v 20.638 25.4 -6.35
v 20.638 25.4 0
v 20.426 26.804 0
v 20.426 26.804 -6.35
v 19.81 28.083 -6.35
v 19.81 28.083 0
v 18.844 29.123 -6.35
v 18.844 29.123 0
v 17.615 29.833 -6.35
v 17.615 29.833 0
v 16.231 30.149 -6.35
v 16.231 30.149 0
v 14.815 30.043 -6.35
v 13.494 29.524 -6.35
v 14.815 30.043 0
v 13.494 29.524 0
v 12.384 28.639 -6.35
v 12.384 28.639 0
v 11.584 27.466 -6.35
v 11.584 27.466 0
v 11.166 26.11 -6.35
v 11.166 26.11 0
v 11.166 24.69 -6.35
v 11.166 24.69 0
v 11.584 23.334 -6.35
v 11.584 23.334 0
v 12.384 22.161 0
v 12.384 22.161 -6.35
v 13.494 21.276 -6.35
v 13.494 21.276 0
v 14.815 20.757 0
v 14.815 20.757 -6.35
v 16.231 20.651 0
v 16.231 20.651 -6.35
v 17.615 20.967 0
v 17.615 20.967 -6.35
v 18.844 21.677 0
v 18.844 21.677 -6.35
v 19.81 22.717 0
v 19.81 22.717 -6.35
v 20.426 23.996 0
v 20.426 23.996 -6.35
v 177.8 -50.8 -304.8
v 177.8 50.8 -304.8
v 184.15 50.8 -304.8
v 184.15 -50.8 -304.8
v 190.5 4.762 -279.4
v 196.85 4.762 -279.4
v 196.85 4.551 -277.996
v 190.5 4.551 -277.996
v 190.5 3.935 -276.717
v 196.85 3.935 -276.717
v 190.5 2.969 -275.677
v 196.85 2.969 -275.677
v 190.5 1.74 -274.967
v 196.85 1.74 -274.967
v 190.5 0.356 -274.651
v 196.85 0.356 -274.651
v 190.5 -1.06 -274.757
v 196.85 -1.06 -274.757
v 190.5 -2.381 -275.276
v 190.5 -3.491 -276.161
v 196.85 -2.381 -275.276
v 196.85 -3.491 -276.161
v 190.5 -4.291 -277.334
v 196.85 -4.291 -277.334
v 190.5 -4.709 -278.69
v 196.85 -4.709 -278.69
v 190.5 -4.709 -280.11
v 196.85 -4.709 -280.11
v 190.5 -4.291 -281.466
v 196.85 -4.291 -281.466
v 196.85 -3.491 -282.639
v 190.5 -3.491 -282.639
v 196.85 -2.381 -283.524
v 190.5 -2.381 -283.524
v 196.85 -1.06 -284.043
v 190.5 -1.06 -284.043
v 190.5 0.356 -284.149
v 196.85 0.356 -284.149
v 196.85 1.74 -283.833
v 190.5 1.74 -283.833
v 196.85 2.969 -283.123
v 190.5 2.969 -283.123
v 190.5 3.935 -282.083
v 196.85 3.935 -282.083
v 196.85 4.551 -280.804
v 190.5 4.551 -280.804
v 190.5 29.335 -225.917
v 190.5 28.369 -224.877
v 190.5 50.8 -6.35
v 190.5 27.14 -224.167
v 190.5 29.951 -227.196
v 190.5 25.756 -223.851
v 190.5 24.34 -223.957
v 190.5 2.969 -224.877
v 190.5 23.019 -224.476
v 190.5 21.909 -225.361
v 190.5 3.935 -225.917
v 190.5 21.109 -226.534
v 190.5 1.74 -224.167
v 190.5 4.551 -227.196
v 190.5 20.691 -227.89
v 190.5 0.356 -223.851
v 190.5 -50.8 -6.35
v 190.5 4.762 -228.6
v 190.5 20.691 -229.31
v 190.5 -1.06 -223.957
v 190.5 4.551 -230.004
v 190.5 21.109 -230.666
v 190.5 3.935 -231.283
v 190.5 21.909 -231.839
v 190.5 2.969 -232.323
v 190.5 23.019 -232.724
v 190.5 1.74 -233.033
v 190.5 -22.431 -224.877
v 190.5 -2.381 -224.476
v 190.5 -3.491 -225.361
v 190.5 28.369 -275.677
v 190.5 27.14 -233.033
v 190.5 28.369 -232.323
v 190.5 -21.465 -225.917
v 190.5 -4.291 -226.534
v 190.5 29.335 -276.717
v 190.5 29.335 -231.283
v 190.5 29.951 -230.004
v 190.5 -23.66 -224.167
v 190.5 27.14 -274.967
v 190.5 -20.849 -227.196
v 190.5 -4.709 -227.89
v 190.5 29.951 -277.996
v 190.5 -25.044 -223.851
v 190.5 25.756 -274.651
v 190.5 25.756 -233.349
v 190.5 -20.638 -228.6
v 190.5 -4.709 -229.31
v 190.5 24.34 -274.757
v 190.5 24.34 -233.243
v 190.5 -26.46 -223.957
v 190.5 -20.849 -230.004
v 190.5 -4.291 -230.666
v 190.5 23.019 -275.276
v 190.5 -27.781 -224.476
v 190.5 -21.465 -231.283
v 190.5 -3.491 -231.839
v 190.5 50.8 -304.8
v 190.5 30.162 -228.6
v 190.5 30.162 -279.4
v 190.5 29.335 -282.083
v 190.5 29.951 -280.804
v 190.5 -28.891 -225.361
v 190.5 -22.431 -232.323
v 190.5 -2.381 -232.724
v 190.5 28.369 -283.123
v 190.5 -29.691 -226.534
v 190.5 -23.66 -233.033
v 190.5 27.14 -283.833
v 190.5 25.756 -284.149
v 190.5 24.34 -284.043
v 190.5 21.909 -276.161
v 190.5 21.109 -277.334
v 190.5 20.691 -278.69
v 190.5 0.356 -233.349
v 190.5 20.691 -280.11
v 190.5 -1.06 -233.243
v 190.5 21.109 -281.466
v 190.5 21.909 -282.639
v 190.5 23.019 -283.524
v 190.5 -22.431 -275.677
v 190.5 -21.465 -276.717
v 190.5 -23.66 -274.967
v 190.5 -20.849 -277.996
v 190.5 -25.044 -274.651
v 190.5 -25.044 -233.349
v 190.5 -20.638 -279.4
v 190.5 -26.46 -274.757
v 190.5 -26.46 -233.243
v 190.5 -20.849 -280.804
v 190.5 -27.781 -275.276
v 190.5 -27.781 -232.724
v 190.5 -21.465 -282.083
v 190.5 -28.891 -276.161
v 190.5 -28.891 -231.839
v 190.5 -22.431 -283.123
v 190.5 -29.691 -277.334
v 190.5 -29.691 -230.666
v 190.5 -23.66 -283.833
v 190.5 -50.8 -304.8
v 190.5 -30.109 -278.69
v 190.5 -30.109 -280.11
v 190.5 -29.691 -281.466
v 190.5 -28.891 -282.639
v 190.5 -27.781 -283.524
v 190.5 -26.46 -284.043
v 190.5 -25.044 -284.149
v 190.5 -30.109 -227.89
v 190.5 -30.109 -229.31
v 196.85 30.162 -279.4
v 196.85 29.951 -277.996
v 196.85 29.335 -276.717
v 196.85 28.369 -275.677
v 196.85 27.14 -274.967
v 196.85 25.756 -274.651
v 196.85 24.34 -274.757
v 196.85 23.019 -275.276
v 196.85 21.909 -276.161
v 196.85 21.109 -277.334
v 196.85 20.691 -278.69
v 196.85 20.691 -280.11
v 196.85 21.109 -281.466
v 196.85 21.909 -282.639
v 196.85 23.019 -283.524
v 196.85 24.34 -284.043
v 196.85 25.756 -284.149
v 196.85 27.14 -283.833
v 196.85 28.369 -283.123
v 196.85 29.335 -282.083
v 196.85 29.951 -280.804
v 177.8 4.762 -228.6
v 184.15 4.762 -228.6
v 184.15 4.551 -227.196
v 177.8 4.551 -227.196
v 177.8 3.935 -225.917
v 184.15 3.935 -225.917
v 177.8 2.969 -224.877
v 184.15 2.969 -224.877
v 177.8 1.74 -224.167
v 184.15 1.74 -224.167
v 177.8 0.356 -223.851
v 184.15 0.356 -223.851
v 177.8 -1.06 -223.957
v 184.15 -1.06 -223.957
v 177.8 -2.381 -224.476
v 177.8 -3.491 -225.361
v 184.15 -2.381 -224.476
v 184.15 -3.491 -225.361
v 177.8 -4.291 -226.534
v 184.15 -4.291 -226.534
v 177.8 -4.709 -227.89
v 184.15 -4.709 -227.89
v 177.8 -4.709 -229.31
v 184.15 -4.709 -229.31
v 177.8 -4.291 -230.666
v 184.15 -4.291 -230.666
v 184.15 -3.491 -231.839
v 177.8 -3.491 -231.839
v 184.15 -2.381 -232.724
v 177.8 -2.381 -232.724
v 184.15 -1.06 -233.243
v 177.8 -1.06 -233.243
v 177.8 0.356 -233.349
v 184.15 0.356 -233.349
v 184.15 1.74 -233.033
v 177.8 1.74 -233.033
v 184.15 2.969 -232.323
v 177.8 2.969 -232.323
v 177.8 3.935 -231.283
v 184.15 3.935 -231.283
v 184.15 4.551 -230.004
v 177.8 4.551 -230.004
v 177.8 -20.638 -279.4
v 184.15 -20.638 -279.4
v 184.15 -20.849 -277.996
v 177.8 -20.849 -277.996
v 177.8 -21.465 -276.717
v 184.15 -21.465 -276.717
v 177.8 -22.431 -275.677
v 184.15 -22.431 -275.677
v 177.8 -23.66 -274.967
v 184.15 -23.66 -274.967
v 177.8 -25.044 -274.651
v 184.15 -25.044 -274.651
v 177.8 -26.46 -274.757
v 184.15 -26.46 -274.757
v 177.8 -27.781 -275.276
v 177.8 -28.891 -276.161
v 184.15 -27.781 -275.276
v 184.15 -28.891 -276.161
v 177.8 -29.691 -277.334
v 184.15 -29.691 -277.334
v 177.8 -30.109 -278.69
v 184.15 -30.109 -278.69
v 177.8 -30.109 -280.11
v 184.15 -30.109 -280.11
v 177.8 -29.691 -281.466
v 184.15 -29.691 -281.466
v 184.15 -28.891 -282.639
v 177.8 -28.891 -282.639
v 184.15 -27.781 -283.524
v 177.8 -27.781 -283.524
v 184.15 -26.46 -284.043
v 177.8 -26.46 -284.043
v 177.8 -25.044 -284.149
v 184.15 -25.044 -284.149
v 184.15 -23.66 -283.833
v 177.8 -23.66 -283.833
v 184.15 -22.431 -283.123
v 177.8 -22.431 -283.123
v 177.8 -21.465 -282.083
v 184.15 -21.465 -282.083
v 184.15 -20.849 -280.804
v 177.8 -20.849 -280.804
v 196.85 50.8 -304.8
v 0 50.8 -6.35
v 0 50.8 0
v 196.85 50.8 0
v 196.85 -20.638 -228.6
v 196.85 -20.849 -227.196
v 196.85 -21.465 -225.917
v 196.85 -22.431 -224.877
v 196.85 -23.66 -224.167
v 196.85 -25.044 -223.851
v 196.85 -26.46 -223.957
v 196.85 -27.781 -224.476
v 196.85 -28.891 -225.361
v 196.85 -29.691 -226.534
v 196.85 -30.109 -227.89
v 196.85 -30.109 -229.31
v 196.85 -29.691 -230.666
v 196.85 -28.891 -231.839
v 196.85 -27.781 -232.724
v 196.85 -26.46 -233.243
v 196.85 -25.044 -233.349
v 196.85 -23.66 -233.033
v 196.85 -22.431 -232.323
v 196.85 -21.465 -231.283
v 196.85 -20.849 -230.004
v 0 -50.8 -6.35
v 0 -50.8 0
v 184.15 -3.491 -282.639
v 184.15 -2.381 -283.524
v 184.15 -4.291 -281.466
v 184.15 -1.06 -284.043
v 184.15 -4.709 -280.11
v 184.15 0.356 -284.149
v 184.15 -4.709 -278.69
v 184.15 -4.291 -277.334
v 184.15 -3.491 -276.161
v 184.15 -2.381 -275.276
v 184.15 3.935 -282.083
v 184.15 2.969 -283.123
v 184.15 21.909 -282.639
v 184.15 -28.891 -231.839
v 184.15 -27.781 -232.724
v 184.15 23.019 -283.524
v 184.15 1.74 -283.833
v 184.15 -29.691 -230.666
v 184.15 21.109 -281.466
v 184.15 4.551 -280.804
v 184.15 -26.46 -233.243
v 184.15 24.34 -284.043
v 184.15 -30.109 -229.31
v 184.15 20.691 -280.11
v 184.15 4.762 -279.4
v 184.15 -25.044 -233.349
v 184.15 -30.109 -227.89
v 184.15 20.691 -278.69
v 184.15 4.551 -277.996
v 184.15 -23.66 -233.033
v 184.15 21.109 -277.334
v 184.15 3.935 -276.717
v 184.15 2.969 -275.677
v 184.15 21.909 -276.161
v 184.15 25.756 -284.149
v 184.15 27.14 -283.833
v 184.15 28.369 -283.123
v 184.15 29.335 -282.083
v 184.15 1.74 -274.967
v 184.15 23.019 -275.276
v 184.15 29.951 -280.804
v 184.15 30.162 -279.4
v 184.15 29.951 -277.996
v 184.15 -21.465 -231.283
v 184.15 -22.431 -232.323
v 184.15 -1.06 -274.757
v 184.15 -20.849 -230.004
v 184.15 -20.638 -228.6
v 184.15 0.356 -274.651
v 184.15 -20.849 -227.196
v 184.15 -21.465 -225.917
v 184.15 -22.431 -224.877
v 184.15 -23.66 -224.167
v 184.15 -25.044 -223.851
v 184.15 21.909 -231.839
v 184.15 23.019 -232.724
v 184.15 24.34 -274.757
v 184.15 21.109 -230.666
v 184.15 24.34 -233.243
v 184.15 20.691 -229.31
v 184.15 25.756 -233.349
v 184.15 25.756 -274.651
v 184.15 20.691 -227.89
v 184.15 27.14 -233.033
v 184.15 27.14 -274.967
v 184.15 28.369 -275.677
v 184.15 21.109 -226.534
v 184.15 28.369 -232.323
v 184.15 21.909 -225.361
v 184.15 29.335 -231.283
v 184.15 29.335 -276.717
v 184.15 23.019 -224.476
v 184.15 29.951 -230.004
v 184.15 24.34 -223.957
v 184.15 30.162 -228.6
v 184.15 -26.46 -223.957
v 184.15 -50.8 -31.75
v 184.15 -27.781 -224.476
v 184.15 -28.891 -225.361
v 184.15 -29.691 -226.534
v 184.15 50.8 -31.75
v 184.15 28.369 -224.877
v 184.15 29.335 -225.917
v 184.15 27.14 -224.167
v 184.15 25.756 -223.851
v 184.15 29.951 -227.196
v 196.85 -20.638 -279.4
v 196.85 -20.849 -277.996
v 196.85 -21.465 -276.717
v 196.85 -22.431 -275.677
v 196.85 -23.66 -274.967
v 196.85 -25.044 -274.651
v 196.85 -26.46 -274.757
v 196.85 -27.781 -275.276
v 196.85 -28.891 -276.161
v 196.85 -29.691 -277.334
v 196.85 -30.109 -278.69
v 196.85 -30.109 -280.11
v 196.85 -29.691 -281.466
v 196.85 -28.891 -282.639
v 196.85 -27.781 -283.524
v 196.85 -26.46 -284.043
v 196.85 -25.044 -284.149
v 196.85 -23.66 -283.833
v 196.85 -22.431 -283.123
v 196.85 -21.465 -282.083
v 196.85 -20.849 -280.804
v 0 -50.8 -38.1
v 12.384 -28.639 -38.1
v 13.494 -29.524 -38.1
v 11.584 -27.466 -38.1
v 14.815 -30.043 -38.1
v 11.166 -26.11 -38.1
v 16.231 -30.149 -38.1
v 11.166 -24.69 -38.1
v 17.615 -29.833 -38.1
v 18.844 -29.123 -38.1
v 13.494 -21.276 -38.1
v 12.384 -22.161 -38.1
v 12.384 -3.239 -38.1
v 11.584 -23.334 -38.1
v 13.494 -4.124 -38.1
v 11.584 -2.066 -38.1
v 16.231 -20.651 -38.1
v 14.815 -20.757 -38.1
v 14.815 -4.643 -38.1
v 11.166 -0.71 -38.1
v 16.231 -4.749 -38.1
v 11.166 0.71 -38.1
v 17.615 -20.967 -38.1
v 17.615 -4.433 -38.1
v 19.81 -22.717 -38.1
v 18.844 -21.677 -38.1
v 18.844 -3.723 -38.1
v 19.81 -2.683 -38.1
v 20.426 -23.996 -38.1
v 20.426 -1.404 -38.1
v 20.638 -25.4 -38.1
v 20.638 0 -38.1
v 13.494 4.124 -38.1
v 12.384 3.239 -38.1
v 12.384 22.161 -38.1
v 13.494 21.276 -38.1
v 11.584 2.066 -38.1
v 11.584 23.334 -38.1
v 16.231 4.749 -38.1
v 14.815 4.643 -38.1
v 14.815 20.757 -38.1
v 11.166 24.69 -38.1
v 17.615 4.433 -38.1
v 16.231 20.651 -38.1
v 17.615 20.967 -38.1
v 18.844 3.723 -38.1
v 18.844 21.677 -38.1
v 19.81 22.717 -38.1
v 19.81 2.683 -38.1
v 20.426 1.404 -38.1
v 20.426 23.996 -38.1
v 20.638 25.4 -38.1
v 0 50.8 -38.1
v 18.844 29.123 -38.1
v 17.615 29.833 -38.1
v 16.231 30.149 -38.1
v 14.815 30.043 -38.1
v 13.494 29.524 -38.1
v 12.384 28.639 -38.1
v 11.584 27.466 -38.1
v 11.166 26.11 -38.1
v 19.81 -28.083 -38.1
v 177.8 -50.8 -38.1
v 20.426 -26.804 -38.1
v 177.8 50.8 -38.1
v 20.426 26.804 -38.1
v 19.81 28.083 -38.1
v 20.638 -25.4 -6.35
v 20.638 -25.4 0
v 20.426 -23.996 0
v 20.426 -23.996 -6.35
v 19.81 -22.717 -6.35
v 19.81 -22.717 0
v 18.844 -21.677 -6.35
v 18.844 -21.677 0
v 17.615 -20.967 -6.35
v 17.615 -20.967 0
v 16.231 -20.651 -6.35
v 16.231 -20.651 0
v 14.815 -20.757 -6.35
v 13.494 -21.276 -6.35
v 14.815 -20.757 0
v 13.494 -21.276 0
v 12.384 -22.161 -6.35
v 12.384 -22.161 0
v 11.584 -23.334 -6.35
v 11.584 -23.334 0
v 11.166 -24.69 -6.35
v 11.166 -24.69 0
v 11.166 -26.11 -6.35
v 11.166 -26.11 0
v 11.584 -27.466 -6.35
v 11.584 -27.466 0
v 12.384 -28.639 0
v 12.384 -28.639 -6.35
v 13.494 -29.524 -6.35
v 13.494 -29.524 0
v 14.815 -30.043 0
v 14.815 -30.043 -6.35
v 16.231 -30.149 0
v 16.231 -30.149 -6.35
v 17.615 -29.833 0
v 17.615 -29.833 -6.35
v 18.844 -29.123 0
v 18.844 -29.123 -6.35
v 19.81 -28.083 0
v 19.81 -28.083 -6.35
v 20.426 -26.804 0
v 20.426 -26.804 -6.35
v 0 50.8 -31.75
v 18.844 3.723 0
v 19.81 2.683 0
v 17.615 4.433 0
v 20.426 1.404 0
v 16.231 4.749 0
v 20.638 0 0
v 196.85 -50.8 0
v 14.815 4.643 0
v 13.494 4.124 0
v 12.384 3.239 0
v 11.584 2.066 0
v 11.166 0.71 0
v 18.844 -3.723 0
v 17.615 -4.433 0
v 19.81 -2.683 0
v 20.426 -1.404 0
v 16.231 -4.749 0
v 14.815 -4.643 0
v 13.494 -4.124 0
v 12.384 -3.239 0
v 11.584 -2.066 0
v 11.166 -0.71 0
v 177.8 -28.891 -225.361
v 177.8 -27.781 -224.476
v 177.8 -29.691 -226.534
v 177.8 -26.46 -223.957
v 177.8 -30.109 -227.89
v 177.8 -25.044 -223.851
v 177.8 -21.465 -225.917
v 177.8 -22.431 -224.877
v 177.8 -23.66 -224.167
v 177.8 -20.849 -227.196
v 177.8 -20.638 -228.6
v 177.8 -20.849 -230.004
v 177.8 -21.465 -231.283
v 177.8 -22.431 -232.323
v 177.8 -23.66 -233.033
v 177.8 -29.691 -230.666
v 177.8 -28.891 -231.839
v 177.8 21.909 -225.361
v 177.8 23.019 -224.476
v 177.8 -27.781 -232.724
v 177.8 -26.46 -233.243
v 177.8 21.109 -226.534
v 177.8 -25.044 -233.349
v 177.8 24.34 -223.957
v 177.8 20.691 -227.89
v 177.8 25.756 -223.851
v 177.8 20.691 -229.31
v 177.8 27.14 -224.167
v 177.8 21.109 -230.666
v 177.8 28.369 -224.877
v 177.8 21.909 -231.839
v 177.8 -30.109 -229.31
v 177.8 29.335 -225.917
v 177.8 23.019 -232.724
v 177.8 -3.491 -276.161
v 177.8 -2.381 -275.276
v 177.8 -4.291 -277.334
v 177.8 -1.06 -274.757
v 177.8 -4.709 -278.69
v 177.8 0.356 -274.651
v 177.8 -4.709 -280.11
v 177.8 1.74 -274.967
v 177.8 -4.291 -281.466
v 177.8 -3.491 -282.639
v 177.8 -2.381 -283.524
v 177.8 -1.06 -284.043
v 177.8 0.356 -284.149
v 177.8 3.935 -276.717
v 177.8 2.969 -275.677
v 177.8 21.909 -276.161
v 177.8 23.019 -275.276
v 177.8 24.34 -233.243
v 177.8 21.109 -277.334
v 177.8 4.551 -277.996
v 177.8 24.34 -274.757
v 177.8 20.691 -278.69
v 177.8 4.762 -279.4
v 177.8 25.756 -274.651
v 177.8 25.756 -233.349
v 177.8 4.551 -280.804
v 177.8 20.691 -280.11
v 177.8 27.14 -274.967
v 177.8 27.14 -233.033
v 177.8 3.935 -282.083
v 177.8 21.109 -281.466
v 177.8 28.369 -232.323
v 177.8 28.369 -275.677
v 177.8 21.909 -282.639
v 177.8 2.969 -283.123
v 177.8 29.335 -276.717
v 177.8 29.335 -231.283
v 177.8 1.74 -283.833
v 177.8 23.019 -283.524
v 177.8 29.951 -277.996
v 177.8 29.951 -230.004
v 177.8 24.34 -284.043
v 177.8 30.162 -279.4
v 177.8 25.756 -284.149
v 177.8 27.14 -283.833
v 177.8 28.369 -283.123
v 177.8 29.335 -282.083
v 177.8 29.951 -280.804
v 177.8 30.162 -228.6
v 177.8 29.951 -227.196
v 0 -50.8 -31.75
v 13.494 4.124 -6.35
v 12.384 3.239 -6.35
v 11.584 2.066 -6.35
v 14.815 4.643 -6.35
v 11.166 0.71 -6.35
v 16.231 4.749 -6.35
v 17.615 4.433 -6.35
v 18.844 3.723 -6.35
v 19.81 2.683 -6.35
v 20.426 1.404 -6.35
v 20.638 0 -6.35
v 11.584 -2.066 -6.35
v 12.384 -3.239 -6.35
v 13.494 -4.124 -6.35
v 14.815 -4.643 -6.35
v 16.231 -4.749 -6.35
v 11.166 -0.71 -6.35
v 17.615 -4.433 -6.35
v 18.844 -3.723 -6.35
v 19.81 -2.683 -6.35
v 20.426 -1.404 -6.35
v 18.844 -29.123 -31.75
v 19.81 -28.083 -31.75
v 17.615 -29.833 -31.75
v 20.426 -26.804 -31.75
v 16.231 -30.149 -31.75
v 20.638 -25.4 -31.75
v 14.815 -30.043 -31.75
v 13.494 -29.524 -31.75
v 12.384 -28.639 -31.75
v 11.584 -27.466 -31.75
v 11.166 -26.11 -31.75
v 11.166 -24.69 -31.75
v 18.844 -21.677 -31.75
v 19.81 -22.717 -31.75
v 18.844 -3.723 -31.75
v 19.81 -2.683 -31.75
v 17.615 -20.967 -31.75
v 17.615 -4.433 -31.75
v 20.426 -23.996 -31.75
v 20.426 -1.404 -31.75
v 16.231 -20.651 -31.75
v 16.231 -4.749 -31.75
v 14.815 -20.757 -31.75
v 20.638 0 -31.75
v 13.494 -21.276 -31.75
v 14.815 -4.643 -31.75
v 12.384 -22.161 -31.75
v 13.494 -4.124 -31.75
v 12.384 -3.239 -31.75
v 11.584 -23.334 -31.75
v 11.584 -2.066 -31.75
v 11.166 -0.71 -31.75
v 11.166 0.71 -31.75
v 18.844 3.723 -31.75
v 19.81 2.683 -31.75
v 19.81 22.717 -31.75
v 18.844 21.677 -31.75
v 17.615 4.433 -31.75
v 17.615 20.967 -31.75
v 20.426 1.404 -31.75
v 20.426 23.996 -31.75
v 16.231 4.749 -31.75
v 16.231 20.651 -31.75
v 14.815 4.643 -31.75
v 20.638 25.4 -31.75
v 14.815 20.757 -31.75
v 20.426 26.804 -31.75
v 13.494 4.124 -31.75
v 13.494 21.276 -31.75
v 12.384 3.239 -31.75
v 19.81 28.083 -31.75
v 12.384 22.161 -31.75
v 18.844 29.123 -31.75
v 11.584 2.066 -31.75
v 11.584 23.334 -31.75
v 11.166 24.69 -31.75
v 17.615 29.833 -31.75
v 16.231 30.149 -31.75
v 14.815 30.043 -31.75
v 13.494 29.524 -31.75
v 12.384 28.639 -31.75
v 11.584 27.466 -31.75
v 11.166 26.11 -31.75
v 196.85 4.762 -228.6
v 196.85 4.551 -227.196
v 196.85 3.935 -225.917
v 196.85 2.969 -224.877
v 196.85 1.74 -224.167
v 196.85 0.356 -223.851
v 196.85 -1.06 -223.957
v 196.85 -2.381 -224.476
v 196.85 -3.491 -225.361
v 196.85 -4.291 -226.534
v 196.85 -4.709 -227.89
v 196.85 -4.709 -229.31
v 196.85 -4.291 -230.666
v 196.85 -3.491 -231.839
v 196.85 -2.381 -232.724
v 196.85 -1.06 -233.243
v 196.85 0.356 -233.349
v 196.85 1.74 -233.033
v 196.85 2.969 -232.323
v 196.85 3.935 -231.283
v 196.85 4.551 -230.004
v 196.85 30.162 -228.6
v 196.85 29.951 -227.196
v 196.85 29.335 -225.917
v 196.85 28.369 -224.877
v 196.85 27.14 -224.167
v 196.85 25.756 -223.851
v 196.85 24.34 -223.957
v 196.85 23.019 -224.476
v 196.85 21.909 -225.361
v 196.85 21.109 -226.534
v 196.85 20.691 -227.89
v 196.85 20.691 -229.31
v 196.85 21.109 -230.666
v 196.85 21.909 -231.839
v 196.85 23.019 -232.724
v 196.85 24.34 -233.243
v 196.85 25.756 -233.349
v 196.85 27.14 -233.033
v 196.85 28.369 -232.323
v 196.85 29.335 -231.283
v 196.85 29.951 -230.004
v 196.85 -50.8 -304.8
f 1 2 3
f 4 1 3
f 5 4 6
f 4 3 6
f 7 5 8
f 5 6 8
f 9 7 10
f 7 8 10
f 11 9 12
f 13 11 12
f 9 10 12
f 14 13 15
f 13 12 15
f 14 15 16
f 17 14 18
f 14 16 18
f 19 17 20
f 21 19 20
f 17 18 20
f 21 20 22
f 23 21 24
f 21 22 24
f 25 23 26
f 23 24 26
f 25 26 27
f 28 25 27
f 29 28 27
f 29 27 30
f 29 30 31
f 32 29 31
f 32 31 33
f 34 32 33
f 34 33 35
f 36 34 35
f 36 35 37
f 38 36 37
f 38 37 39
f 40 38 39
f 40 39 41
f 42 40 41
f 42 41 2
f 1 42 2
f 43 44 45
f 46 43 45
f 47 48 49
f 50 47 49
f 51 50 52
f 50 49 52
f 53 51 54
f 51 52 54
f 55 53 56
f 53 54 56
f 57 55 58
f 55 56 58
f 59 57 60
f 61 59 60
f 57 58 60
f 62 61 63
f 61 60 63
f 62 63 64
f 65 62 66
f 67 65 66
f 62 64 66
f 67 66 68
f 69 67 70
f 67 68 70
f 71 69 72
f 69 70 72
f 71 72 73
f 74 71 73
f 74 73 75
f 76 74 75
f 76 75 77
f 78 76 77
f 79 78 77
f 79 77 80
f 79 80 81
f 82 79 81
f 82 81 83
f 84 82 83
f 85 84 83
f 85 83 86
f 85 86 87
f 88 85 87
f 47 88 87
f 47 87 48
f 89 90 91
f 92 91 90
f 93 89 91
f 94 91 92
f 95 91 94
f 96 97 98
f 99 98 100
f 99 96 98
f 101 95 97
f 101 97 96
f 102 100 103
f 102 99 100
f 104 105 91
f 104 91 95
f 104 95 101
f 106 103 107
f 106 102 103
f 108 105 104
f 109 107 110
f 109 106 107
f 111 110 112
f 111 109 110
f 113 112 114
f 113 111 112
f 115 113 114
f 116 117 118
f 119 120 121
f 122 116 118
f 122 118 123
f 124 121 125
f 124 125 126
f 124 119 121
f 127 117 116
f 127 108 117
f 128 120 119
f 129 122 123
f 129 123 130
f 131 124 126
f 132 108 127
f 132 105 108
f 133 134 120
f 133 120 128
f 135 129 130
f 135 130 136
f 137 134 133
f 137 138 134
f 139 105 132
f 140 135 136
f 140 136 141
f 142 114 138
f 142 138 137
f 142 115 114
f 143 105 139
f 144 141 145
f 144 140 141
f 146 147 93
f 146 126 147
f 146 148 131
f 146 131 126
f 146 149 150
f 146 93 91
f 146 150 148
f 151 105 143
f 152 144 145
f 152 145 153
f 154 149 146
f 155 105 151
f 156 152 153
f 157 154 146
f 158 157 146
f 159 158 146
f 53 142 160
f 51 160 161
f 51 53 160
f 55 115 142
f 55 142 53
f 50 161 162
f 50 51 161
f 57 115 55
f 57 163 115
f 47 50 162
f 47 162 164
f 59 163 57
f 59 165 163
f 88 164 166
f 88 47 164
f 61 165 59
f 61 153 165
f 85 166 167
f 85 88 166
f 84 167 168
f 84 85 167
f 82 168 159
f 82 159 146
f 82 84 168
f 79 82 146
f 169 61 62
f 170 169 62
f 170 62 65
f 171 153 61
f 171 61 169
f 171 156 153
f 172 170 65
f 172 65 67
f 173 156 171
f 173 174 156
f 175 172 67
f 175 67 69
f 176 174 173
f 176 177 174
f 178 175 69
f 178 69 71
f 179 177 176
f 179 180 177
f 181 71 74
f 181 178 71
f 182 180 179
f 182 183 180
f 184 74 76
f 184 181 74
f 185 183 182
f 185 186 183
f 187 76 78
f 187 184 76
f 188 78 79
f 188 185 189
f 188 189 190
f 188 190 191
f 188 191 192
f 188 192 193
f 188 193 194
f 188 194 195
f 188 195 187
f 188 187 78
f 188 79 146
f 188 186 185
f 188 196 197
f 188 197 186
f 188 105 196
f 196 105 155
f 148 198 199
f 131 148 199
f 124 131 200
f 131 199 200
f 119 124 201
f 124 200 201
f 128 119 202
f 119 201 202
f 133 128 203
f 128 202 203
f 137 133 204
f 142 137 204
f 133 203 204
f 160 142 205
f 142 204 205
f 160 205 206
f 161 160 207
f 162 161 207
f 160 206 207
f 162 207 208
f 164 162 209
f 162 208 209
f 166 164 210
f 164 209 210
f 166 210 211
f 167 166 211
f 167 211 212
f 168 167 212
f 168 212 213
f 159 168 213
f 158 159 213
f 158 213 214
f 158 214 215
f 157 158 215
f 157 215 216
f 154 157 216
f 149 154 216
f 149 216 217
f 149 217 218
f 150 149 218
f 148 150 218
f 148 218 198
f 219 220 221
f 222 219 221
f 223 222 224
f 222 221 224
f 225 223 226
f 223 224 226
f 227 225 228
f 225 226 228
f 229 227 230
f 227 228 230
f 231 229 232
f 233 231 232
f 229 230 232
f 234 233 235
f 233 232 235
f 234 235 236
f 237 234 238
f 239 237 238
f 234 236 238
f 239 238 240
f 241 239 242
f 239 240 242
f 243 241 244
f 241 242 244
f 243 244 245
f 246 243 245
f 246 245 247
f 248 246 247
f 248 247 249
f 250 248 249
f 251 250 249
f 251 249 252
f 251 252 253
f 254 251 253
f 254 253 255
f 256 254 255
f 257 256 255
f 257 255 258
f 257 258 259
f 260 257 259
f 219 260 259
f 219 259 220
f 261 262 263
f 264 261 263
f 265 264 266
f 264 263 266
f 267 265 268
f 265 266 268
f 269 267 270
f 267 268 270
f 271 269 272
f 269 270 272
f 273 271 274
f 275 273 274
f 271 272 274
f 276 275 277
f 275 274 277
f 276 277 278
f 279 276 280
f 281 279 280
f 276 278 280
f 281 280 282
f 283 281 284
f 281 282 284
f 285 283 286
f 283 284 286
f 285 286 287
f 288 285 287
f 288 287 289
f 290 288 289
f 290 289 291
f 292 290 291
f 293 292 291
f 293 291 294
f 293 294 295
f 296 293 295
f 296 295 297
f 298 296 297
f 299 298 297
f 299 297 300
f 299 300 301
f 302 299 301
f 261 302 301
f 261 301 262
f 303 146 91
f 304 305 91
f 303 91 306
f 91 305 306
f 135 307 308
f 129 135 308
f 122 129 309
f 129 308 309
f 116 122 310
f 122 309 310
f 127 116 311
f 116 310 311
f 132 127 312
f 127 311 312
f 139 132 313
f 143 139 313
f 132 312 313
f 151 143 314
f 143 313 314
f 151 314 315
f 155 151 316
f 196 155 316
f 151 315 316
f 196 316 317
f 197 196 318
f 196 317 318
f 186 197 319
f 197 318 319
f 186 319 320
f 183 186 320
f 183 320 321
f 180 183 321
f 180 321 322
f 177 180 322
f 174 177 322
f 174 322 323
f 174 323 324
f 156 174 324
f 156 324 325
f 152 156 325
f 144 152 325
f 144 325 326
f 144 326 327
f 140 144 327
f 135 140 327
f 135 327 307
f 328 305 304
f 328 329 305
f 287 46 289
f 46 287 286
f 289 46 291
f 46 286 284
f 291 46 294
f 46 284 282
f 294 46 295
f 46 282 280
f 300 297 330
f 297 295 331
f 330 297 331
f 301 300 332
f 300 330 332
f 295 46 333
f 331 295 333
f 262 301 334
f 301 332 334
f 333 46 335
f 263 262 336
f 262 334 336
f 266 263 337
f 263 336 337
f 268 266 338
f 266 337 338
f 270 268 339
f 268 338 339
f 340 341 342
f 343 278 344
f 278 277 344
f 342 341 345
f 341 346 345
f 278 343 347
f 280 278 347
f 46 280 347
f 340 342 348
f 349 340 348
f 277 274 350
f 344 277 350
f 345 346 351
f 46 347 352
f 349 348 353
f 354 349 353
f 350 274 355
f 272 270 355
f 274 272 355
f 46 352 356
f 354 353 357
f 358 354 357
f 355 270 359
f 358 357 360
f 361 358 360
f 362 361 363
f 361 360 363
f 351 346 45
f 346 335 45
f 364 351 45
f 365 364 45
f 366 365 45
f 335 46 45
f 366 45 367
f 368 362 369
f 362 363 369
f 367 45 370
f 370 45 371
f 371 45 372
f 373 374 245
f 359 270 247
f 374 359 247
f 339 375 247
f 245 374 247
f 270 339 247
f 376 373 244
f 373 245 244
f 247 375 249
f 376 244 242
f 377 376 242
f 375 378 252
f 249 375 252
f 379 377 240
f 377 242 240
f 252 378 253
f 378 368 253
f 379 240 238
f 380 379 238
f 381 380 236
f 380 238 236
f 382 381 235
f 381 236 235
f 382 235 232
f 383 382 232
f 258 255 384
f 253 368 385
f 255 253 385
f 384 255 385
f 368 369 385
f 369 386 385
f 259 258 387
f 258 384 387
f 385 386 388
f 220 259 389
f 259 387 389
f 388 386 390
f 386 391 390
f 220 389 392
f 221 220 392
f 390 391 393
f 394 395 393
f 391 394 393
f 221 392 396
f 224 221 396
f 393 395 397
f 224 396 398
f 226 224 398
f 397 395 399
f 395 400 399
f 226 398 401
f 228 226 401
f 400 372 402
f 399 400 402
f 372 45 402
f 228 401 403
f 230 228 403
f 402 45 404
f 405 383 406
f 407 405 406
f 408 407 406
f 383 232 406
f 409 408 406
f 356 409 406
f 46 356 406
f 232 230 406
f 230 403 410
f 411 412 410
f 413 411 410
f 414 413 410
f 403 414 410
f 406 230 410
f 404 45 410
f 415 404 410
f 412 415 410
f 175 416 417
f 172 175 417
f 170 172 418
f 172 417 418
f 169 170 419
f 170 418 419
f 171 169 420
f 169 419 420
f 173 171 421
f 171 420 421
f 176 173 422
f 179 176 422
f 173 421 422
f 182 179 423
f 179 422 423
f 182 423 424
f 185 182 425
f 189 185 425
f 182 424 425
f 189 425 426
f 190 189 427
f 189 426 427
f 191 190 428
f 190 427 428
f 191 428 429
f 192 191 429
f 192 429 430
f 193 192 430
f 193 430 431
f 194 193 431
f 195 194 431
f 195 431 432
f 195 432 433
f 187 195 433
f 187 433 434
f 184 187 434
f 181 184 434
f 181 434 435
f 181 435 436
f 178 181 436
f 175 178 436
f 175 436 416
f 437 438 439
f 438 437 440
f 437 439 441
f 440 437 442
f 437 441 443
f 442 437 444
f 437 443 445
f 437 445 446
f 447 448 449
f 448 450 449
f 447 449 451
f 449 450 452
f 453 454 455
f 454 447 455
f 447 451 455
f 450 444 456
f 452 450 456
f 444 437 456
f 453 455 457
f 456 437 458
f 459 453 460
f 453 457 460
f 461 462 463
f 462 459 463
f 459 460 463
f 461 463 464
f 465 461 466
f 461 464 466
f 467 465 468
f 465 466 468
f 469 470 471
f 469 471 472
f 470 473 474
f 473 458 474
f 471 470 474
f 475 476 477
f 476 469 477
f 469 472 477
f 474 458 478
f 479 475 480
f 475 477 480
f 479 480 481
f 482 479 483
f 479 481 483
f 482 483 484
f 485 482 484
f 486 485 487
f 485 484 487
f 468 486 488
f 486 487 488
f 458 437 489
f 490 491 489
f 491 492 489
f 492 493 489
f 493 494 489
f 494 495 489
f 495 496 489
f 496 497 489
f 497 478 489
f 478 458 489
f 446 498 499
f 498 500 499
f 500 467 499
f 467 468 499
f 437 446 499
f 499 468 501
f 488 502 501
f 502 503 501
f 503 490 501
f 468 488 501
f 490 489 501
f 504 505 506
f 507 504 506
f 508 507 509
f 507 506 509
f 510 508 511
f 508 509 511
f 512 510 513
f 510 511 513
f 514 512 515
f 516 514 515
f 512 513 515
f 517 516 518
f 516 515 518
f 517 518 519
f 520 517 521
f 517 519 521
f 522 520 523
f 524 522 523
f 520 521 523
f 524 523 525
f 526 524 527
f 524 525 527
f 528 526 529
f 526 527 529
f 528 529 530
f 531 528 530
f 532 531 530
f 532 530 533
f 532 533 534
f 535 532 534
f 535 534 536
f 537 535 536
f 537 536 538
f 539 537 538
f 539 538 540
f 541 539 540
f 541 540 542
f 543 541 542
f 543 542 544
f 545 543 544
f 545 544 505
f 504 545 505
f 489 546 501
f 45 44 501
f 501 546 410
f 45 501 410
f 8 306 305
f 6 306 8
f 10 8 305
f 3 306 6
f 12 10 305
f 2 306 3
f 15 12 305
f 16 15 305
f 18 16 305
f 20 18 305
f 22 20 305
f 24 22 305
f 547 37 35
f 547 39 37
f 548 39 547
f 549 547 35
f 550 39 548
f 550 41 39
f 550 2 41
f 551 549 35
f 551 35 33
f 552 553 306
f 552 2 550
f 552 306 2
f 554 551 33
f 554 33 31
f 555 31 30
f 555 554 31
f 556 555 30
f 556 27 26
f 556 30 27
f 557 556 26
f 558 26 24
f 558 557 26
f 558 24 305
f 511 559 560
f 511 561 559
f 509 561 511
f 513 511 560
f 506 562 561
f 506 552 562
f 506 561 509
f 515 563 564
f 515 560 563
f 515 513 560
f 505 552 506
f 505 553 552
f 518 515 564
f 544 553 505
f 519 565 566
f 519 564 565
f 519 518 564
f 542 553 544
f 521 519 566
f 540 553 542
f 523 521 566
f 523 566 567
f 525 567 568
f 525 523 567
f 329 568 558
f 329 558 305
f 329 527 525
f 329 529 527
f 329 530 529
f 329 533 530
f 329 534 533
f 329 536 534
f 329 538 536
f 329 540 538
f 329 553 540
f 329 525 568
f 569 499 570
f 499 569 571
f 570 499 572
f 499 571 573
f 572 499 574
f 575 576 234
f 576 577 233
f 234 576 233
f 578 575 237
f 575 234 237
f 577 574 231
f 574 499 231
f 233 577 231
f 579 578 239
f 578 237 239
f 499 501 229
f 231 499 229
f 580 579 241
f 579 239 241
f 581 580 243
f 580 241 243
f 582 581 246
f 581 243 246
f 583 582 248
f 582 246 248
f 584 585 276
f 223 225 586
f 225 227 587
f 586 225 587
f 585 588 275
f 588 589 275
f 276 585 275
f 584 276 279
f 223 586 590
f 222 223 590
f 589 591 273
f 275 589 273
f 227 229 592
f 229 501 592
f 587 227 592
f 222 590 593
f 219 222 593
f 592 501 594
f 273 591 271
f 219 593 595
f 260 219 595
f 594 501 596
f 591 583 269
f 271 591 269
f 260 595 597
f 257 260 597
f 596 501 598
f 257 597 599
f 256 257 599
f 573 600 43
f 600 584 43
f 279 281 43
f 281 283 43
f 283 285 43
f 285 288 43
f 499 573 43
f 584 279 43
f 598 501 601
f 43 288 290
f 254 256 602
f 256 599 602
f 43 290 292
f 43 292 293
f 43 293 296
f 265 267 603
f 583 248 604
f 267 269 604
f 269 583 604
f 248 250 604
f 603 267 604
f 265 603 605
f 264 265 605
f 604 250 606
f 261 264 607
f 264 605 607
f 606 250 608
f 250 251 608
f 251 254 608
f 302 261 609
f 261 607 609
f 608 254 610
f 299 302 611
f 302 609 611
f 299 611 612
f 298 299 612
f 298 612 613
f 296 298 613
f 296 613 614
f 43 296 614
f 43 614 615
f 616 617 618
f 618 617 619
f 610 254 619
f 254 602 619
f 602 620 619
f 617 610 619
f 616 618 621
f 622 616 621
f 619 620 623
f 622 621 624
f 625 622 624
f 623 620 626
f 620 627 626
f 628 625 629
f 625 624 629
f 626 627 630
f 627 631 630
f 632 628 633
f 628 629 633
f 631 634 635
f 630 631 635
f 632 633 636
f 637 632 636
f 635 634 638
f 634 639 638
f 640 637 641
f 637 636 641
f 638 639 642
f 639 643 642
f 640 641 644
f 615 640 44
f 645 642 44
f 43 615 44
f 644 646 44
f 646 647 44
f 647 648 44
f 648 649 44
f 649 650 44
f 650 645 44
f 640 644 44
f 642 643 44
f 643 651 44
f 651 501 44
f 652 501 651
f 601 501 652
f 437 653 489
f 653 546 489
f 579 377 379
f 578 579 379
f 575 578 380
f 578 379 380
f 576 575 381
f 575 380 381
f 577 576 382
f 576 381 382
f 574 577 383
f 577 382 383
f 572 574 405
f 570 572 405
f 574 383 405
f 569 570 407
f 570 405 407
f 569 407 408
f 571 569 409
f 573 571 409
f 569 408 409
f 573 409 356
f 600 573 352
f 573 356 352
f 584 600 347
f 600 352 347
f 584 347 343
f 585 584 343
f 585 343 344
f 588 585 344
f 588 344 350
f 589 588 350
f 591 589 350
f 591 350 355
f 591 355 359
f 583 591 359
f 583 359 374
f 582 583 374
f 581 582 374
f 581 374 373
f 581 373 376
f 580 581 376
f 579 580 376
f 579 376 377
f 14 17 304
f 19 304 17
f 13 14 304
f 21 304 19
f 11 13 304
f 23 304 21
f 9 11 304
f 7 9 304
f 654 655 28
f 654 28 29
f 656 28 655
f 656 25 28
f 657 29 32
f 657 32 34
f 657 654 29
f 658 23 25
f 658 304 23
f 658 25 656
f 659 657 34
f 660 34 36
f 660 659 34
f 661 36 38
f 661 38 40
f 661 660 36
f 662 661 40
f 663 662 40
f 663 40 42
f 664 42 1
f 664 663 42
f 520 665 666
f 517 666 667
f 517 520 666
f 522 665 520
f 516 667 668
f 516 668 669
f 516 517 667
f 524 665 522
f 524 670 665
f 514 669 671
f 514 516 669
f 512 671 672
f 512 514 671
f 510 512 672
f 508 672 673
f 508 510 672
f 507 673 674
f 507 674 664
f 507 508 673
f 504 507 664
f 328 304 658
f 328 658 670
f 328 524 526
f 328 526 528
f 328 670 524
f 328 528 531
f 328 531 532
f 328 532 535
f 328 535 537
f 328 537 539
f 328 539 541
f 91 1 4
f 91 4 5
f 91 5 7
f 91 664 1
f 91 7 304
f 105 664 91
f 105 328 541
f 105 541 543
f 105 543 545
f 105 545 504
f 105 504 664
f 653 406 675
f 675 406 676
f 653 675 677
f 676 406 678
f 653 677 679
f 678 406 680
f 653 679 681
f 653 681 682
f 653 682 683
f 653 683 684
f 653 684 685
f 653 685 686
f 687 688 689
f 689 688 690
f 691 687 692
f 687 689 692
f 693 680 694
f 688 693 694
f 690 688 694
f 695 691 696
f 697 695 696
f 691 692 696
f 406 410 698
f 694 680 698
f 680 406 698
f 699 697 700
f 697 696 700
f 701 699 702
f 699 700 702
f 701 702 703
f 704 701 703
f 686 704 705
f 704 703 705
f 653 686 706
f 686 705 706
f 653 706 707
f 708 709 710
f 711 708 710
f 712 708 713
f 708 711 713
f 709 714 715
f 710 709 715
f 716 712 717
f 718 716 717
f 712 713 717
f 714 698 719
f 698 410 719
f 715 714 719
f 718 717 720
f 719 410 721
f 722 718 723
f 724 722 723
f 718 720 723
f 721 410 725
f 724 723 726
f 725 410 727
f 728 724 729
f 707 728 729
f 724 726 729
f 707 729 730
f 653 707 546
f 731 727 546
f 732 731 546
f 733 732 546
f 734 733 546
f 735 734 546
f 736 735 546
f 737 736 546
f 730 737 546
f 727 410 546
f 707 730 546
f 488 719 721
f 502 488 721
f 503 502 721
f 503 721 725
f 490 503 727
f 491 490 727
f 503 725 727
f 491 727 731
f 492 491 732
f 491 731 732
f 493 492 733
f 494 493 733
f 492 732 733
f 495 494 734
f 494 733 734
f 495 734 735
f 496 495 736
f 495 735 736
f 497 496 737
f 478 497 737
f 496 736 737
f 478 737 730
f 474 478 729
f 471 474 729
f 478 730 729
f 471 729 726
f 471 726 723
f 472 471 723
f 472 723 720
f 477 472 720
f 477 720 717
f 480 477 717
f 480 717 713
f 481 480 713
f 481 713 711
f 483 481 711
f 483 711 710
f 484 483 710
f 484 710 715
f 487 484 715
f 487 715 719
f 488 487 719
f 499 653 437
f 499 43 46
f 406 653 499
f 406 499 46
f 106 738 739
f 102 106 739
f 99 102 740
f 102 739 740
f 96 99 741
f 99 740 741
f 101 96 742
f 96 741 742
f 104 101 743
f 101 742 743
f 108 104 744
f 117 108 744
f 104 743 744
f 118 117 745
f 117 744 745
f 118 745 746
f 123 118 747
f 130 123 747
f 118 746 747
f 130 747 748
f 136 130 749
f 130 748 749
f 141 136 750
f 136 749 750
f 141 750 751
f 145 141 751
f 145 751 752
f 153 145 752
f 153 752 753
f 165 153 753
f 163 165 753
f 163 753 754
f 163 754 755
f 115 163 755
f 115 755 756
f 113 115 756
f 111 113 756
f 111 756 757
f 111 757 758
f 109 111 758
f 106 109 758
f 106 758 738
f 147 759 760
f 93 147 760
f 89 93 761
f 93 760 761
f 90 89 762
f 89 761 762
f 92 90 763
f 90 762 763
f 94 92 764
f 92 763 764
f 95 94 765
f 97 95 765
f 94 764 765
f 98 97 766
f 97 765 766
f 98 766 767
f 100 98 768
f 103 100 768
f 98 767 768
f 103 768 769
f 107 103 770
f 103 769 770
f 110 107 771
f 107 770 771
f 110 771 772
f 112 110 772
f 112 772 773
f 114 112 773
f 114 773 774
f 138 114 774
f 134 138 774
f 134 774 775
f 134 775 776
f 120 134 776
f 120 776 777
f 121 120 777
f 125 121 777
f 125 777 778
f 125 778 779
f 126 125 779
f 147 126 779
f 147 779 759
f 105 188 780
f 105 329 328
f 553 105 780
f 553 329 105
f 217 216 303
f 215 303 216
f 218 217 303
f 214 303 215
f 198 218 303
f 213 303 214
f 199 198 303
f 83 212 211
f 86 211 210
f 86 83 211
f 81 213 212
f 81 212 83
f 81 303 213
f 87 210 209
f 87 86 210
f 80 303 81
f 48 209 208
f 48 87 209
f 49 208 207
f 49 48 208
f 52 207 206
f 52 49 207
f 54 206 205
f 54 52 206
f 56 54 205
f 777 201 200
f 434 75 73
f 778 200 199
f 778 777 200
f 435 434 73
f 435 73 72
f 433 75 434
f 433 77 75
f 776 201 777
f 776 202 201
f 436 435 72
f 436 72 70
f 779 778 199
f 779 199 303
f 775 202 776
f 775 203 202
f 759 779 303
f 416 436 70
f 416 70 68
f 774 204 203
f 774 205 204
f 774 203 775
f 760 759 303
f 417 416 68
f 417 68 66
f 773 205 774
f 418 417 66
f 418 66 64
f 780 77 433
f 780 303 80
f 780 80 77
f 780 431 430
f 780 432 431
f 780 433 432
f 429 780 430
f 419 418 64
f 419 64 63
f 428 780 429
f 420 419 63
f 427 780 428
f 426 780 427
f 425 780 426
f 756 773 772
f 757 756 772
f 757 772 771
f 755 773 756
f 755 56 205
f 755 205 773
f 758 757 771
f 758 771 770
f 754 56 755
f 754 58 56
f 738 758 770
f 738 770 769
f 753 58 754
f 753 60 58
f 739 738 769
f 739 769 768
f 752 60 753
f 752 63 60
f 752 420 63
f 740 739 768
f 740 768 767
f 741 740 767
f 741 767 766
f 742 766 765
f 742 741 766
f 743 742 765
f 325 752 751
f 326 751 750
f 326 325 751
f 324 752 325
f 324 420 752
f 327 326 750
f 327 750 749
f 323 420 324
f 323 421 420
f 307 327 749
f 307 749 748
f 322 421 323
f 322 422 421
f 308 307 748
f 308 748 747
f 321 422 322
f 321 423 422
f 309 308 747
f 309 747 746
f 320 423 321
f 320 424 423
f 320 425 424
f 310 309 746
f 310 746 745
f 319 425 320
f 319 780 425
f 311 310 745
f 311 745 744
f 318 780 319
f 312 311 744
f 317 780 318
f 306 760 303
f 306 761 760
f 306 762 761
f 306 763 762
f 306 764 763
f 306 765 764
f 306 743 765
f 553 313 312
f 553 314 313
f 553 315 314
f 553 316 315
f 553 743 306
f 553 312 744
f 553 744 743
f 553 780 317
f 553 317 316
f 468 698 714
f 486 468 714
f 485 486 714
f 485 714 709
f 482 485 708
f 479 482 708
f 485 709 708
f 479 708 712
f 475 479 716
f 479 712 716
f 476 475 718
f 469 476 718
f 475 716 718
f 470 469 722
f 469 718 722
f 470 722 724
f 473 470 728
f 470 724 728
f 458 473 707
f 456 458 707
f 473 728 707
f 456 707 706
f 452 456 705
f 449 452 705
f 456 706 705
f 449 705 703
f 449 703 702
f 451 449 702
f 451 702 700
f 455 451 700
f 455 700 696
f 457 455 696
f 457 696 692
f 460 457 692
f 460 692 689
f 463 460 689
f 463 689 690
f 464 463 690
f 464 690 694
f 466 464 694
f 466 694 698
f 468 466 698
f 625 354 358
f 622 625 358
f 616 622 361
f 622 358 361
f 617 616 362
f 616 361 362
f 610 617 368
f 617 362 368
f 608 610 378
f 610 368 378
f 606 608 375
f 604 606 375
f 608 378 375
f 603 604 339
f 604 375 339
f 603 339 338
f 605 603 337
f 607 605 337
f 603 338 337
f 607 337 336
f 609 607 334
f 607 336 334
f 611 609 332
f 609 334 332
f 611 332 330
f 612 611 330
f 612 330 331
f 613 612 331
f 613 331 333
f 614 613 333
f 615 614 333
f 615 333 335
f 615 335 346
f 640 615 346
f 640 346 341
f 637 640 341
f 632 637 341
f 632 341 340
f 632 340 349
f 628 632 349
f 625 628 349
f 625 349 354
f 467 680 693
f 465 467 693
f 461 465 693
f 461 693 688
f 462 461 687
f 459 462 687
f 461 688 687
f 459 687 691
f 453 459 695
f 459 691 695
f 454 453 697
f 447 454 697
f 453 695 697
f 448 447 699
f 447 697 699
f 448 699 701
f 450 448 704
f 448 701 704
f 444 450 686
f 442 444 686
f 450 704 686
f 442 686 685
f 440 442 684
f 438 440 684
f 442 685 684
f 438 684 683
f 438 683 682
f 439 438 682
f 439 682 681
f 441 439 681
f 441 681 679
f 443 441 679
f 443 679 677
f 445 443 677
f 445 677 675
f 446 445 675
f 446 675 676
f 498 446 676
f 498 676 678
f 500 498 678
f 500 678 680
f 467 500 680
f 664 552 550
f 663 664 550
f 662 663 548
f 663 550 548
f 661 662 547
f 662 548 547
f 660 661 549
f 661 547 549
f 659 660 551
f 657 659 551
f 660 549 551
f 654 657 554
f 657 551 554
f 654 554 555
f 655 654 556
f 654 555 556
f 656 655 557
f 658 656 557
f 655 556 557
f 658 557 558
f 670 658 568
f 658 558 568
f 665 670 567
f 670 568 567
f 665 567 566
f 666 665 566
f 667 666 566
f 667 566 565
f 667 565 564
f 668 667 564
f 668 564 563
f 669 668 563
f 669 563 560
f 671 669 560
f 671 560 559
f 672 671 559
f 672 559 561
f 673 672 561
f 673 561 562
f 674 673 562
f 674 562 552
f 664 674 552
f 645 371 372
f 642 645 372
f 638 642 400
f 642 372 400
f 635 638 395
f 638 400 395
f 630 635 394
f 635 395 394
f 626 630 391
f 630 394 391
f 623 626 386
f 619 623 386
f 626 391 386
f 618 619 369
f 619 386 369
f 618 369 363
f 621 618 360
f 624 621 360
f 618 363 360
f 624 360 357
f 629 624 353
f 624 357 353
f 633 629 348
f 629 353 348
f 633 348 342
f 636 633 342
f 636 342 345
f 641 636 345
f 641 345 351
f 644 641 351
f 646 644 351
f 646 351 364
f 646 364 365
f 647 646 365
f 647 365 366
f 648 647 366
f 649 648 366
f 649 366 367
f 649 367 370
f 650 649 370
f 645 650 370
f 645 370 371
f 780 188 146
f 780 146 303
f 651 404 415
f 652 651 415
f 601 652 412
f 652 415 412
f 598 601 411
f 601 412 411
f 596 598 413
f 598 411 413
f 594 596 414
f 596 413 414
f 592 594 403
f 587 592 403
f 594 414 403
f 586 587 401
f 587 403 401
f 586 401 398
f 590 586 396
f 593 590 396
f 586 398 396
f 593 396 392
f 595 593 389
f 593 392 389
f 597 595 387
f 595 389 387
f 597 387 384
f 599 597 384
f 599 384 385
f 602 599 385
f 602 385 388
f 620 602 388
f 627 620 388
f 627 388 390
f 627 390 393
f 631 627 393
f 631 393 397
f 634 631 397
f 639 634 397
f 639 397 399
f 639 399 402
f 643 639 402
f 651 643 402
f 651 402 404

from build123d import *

# Parameters (mm, degrees)
F1_DEPTH = 50.8
F2_R     = 4.7625
F3_DEPTH = 196.851
F4_R     = 4.7625
F5_DEPTH = 304.801


with BuildPart() as f1:
    # F0 (on Front) → F1 (new body, symmetric)
    with BuildSketch(Plane.XZ):
        Polygon((184.15, -31.75), (0, -31.75), (0, -38.1), (177.8, -38.1), (177.8, -304.8), (184.15, -304.8), align=None)
        Polygon((0, -6.35), (190.5, -6.35), (190.5, -304.8), (196.85, -304.8), (196.85, 0), (0, 0), align=None)
    extrude(amount=F1_DEPTH, both=True)

    # F2 (on face) → F3 (cut, through all)
    with BuildSketch(Plane.YZ.offset(196.85)):
        with Locations((-25.4, -279.4)):
            Circle(F2_R)
        with Locations((-25.4, -228.6)):
            Circle(F2_R)
        with Locations((0, -279.4)):
            Circle(F2_R)
        with Locations((0, -228.6)):
            Circle(F2_R)
        with Locations((25.4, -279.4)):
            Circle(F2_R)
        with Locations((25.4, -228.6)):
            Circle(F2_R)
    extrude(amount=-F3_DEPTH, mode=Mode.SUBTRACT)

    # F4 (on face) → F5 (cut, through all)
    with BuildSketch(Plane.XY):
        with Locations((15.875, -25.4)):
            Circle(F4_R)
        with Locations((15.875, 0)):
            Circle(F4_R)
        with Locations((15.875, 25.4)):
            Circle(F4_R)
    extrude(amount=-F5_DEPTH, mode=Mode.SUBTRACT)


solid = f1.part
